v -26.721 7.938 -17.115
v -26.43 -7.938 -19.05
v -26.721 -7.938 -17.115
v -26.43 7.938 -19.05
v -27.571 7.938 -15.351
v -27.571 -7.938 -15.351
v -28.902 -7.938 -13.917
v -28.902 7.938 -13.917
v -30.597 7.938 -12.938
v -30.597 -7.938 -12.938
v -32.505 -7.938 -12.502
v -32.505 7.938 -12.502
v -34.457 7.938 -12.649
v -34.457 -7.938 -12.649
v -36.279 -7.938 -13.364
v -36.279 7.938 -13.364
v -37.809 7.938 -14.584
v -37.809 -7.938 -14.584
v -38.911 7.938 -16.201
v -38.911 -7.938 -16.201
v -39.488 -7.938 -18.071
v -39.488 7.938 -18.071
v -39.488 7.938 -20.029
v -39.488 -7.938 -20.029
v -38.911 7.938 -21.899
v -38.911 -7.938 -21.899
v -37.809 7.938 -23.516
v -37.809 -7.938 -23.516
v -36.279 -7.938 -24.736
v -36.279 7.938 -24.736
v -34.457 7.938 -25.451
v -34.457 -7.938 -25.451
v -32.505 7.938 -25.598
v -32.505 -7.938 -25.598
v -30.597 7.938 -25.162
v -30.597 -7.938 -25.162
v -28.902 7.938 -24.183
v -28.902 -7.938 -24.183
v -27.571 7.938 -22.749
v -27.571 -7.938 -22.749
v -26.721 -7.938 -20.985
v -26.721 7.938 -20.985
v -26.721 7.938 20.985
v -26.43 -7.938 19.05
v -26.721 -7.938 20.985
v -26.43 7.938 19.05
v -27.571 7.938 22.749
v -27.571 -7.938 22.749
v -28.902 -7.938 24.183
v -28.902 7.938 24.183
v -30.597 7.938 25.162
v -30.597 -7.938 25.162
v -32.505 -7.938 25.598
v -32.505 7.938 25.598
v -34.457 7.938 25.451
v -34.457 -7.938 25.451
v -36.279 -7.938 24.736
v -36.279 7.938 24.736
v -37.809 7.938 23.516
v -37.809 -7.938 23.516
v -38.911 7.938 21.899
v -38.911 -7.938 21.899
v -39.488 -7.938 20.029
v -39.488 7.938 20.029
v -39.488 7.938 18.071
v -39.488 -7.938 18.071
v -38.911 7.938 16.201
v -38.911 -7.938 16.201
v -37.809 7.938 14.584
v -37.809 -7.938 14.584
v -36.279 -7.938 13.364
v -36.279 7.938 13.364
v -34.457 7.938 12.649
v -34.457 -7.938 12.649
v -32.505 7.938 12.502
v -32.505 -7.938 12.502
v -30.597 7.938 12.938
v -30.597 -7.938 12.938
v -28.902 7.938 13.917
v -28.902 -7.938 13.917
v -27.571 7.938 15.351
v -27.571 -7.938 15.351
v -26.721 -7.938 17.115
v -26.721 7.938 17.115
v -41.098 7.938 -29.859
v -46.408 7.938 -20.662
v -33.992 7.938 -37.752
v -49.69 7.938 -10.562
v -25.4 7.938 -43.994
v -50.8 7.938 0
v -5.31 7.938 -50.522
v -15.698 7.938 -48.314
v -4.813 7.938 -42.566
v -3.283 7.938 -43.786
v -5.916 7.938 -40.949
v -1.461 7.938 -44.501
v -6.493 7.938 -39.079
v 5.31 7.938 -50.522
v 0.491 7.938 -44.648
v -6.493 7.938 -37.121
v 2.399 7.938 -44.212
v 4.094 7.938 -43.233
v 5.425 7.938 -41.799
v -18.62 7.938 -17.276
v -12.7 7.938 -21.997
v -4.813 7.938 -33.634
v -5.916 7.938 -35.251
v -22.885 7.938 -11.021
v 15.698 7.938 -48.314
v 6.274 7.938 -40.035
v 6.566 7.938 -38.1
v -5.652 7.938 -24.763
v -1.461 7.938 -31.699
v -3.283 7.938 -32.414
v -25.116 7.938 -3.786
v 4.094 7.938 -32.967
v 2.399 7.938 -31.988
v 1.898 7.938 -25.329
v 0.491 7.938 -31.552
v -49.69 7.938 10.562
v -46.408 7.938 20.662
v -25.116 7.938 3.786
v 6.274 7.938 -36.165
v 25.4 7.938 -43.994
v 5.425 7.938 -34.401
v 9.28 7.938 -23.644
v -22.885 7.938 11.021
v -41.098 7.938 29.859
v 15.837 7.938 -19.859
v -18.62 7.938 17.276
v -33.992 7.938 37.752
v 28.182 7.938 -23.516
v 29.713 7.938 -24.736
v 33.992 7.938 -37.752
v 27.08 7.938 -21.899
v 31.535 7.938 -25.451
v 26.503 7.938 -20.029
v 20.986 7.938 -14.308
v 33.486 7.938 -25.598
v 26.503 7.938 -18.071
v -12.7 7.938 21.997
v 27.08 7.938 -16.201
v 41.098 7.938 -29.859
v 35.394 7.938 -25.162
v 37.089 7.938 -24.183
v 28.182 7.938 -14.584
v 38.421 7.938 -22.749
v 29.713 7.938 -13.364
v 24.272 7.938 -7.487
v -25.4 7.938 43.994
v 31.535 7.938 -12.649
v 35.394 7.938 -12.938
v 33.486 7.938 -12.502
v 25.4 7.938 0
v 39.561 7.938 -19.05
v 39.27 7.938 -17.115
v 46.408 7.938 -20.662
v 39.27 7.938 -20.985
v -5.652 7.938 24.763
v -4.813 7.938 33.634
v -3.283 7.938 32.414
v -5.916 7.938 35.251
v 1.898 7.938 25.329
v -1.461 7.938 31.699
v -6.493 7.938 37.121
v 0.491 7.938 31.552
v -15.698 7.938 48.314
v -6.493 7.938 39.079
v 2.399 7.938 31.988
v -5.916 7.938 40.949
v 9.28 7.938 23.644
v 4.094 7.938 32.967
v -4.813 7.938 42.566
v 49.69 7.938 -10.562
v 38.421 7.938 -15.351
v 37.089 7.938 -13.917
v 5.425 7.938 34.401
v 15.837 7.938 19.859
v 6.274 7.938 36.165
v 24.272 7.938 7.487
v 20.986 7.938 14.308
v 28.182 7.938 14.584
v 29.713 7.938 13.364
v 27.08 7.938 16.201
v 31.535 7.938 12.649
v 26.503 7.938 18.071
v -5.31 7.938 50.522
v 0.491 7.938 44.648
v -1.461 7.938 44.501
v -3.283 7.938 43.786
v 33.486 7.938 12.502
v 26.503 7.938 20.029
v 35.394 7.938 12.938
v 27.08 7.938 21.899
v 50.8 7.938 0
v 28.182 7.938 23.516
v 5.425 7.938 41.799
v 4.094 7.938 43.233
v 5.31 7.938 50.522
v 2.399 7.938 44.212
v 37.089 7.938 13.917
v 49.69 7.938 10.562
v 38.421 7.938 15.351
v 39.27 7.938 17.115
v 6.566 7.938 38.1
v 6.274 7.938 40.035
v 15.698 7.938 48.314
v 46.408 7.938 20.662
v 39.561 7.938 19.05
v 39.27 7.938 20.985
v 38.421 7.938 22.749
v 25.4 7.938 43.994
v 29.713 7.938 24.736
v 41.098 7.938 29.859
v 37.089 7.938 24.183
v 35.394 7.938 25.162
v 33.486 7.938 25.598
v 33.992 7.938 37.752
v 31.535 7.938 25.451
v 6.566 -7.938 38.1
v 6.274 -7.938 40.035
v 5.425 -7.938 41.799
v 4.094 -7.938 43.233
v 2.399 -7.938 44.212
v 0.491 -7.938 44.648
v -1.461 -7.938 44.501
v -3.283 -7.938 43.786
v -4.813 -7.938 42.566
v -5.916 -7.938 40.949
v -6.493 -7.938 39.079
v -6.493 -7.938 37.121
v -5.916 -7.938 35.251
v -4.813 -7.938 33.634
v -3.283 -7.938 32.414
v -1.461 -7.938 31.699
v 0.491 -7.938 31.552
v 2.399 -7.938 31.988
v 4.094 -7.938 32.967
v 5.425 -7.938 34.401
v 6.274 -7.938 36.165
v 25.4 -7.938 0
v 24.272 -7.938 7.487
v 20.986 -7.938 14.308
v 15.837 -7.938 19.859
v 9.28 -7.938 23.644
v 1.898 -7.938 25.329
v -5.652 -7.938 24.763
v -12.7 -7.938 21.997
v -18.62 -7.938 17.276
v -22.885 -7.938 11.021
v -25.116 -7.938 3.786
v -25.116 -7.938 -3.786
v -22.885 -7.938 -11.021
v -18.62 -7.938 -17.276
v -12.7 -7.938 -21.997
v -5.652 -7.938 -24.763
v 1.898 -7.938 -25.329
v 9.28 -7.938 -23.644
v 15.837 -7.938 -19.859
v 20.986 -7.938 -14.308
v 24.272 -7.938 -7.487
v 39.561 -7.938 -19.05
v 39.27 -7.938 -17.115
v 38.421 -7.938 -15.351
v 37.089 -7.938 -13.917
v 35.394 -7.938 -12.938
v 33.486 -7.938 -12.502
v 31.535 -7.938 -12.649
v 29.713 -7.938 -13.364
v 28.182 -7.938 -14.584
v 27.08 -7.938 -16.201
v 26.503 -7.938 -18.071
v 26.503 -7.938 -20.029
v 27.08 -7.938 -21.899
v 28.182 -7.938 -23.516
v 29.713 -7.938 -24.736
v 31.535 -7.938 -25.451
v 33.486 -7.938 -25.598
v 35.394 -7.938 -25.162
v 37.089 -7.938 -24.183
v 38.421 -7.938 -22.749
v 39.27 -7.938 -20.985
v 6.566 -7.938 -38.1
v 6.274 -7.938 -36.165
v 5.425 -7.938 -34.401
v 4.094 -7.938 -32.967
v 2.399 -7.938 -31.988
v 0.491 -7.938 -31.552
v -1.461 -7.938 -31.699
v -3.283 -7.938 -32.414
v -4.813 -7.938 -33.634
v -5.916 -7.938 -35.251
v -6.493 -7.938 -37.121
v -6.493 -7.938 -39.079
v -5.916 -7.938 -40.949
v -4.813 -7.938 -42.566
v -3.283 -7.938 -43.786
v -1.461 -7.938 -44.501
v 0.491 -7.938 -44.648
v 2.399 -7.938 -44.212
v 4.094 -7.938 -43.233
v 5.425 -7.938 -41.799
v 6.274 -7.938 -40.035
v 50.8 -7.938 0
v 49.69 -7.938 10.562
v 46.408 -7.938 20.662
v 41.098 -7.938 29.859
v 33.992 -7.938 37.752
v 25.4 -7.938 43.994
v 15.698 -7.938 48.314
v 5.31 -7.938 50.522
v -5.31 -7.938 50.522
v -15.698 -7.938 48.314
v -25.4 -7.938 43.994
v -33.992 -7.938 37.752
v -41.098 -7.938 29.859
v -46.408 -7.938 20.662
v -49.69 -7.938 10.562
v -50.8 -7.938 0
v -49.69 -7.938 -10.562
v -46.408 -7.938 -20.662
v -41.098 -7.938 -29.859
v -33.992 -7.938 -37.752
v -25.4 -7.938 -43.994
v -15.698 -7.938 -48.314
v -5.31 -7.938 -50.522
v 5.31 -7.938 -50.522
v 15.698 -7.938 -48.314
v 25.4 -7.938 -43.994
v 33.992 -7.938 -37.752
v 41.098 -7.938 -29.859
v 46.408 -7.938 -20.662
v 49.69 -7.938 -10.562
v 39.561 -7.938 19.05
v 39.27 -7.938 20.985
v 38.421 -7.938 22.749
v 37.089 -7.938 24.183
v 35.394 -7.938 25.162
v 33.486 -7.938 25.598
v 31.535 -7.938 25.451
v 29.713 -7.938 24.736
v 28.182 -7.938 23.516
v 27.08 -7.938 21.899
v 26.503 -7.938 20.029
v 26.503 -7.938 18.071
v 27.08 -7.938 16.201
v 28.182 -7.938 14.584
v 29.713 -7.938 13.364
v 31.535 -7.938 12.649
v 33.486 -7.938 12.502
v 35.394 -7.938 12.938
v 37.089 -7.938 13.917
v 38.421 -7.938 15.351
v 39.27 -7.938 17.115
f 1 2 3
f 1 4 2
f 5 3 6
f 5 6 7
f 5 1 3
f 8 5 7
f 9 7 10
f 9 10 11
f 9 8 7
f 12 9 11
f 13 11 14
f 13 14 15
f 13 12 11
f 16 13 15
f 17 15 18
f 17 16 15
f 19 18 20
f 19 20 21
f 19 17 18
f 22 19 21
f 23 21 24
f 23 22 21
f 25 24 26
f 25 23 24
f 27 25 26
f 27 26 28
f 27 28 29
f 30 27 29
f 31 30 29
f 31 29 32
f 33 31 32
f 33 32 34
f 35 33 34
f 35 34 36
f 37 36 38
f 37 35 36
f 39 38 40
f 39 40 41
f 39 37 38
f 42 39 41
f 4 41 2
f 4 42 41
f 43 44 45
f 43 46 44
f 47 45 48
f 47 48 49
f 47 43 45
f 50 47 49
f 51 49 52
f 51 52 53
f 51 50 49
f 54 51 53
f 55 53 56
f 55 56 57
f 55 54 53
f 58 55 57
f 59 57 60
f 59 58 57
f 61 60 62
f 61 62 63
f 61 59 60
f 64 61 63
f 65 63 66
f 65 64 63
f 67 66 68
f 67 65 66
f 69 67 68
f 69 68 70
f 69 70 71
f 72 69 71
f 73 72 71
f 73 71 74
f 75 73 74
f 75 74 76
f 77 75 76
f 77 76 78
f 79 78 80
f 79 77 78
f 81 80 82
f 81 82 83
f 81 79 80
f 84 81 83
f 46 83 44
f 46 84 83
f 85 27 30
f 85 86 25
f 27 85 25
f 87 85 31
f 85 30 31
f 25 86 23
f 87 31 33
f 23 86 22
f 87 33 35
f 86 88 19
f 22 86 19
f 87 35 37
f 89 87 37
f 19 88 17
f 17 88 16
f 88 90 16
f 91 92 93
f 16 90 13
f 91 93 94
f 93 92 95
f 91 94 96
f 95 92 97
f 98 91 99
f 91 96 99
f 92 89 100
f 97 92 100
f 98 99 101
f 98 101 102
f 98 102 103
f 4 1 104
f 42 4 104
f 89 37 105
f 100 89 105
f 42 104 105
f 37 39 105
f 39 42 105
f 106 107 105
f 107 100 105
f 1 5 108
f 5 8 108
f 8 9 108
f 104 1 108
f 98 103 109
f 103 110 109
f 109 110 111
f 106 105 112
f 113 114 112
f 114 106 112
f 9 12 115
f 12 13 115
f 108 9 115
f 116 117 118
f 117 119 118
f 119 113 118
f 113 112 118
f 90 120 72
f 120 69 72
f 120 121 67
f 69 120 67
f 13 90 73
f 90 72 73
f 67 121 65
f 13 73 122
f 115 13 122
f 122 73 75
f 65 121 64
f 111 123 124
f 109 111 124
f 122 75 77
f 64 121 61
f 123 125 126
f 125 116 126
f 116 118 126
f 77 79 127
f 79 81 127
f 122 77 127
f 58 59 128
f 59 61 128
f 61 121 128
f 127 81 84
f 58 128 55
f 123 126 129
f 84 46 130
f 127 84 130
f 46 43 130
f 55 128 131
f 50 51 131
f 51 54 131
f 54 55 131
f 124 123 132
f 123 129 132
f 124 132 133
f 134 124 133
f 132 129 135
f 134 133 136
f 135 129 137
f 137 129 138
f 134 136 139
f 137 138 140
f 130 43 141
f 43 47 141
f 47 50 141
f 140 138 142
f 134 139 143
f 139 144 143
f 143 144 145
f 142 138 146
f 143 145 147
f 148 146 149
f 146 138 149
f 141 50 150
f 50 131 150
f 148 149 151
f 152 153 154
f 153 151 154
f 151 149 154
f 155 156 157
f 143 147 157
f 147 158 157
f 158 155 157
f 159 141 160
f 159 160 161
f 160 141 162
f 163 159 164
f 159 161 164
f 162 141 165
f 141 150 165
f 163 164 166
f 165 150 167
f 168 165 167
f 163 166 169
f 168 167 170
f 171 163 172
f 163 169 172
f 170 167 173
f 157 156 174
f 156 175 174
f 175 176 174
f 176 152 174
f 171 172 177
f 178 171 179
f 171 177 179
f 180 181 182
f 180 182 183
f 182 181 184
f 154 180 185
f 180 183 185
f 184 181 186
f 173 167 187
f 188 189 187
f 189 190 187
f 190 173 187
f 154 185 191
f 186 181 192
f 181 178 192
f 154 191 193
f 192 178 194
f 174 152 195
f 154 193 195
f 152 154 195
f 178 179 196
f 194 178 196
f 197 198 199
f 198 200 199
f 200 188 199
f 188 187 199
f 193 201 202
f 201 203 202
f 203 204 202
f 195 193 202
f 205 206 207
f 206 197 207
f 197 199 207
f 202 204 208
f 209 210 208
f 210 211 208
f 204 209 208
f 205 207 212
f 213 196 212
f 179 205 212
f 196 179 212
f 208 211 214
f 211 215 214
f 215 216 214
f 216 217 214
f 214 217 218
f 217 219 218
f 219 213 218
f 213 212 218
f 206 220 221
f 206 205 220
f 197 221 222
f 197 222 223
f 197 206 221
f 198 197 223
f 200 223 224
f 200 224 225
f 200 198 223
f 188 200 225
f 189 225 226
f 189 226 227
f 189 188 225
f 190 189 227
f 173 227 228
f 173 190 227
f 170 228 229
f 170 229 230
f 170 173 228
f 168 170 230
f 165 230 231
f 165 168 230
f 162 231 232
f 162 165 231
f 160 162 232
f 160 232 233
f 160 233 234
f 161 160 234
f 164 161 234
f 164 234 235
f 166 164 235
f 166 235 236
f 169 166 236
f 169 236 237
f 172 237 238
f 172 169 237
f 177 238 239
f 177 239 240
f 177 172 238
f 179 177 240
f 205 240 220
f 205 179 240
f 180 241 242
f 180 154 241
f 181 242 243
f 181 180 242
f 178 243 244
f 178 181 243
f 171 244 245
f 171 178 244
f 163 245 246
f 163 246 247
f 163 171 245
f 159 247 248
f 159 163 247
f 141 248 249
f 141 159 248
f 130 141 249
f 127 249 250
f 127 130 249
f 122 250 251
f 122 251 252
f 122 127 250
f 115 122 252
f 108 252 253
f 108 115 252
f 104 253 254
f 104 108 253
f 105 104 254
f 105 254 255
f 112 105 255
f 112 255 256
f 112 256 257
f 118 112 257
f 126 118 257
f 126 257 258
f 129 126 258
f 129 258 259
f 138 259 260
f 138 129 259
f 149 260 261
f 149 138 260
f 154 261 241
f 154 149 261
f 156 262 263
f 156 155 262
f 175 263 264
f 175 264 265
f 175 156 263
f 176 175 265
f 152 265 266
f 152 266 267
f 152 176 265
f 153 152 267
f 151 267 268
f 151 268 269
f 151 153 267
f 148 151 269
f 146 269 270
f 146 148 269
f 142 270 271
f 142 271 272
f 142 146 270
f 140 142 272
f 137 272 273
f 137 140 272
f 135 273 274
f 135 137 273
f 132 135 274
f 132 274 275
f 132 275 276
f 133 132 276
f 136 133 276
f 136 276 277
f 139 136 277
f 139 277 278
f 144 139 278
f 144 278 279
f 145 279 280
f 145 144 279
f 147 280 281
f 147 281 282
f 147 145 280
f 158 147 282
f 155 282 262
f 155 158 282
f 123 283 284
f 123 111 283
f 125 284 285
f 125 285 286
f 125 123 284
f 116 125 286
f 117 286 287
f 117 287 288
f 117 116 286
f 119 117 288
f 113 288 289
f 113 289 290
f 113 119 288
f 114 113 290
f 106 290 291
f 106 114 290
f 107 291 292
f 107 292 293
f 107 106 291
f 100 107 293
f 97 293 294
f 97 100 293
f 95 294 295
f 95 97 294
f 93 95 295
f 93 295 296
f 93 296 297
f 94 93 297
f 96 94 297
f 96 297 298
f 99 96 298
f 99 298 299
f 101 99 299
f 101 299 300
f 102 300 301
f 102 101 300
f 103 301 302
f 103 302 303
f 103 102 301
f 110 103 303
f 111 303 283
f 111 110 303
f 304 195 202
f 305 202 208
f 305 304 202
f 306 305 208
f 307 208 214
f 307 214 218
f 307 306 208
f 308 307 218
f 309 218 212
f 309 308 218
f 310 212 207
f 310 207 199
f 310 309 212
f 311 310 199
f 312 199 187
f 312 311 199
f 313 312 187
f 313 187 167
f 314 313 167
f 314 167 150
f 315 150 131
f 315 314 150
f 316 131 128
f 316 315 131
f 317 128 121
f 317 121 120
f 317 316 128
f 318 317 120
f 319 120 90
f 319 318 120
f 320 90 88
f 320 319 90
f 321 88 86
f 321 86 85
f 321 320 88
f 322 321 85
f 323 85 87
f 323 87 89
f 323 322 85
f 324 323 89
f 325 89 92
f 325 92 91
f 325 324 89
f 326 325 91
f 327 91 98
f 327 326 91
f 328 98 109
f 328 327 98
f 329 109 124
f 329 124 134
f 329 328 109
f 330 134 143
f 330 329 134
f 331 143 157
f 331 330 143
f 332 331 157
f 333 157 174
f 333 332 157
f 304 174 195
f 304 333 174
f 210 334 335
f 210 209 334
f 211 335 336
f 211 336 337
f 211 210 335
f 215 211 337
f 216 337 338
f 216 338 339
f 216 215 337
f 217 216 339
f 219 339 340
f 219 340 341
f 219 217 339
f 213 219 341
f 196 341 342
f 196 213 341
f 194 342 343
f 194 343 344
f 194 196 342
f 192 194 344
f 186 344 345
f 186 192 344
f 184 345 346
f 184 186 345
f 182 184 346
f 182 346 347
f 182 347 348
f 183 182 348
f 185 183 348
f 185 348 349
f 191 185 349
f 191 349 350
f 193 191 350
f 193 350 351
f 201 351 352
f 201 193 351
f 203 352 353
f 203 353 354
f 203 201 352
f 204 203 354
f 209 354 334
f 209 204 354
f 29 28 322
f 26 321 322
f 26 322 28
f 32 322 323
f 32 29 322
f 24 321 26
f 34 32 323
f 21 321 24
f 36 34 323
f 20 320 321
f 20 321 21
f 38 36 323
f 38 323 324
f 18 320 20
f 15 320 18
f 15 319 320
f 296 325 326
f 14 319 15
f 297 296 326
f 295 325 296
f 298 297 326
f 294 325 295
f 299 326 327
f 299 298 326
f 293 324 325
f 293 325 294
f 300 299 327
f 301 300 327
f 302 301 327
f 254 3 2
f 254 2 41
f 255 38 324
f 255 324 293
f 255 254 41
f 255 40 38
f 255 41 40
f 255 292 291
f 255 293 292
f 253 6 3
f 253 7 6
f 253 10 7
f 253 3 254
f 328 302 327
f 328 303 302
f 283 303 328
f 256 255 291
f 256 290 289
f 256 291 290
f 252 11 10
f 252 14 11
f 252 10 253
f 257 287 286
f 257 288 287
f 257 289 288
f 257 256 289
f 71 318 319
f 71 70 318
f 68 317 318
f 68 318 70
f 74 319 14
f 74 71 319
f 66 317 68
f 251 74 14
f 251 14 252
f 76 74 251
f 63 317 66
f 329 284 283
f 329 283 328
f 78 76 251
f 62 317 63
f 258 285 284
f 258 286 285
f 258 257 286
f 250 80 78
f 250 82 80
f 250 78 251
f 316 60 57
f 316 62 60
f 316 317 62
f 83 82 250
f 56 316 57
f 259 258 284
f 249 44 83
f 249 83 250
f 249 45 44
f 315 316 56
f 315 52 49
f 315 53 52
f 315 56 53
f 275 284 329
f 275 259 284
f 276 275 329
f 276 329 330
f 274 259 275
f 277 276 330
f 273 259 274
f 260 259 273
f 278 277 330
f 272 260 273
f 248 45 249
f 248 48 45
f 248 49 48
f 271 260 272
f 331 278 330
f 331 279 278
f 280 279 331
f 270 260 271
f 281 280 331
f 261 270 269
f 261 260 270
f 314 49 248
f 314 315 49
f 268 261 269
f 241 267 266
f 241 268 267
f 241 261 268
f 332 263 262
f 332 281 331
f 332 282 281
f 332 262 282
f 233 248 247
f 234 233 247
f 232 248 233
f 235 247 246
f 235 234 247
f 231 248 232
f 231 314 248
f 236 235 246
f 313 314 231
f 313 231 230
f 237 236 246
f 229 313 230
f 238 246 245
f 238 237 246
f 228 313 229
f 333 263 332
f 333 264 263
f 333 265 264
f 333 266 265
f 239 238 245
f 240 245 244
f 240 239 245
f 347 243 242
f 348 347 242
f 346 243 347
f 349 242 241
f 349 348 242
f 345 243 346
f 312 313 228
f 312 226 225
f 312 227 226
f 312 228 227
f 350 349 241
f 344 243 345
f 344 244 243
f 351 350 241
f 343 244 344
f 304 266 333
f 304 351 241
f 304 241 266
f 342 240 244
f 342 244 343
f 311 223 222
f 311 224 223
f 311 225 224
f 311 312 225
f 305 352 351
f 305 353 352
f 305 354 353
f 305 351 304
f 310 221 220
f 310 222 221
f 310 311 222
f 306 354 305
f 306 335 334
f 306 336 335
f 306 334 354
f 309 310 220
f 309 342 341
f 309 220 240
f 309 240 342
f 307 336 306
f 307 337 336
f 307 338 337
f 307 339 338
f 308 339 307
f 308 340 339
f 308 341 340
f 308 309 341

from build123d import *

# Parameters (mm, degrees)
F0_R     = 50.8
F0_R_2   = 6.565866
F0_R_3   = 25.4
F1_DEPTH = 7.9375


with BuildPart() as f1:
    # F0 (on Front) → F1 (new body, symmetric)
    with BuildSketch(Plane.XZ):
        Circle(F0_R)
        with Locations((0, -38.1)):
            Circle(F0_R_2, mode=Mode.SUBTRACT)
        with Locations((-32.995568, -19.05)):
            Circle(F0_R_2, mode=Mode.SUBTRACT)
        Circle(F0_R_3, mode=Mode.SUBTRACT)
        with Locations((32.995568, -19.05)):
            Circle(F0_R_2, mode=Mode.SUBTRACT)
        with Locations((-32.995568, 19.05)):
            Circle(F0_R_2, mode=Mode.SUBTRACT)
        with Locations((0, 38.1)):
            Circle(F0_R_2, mode=Mode.SUBTRACT)
        with Locations((32.995568, 19.05)):
            Circle(F0_R_2, mode=Mode.SUBTRACT)
    extrude(amount=F1_DEPTH, both=True)


solid = f1.part
